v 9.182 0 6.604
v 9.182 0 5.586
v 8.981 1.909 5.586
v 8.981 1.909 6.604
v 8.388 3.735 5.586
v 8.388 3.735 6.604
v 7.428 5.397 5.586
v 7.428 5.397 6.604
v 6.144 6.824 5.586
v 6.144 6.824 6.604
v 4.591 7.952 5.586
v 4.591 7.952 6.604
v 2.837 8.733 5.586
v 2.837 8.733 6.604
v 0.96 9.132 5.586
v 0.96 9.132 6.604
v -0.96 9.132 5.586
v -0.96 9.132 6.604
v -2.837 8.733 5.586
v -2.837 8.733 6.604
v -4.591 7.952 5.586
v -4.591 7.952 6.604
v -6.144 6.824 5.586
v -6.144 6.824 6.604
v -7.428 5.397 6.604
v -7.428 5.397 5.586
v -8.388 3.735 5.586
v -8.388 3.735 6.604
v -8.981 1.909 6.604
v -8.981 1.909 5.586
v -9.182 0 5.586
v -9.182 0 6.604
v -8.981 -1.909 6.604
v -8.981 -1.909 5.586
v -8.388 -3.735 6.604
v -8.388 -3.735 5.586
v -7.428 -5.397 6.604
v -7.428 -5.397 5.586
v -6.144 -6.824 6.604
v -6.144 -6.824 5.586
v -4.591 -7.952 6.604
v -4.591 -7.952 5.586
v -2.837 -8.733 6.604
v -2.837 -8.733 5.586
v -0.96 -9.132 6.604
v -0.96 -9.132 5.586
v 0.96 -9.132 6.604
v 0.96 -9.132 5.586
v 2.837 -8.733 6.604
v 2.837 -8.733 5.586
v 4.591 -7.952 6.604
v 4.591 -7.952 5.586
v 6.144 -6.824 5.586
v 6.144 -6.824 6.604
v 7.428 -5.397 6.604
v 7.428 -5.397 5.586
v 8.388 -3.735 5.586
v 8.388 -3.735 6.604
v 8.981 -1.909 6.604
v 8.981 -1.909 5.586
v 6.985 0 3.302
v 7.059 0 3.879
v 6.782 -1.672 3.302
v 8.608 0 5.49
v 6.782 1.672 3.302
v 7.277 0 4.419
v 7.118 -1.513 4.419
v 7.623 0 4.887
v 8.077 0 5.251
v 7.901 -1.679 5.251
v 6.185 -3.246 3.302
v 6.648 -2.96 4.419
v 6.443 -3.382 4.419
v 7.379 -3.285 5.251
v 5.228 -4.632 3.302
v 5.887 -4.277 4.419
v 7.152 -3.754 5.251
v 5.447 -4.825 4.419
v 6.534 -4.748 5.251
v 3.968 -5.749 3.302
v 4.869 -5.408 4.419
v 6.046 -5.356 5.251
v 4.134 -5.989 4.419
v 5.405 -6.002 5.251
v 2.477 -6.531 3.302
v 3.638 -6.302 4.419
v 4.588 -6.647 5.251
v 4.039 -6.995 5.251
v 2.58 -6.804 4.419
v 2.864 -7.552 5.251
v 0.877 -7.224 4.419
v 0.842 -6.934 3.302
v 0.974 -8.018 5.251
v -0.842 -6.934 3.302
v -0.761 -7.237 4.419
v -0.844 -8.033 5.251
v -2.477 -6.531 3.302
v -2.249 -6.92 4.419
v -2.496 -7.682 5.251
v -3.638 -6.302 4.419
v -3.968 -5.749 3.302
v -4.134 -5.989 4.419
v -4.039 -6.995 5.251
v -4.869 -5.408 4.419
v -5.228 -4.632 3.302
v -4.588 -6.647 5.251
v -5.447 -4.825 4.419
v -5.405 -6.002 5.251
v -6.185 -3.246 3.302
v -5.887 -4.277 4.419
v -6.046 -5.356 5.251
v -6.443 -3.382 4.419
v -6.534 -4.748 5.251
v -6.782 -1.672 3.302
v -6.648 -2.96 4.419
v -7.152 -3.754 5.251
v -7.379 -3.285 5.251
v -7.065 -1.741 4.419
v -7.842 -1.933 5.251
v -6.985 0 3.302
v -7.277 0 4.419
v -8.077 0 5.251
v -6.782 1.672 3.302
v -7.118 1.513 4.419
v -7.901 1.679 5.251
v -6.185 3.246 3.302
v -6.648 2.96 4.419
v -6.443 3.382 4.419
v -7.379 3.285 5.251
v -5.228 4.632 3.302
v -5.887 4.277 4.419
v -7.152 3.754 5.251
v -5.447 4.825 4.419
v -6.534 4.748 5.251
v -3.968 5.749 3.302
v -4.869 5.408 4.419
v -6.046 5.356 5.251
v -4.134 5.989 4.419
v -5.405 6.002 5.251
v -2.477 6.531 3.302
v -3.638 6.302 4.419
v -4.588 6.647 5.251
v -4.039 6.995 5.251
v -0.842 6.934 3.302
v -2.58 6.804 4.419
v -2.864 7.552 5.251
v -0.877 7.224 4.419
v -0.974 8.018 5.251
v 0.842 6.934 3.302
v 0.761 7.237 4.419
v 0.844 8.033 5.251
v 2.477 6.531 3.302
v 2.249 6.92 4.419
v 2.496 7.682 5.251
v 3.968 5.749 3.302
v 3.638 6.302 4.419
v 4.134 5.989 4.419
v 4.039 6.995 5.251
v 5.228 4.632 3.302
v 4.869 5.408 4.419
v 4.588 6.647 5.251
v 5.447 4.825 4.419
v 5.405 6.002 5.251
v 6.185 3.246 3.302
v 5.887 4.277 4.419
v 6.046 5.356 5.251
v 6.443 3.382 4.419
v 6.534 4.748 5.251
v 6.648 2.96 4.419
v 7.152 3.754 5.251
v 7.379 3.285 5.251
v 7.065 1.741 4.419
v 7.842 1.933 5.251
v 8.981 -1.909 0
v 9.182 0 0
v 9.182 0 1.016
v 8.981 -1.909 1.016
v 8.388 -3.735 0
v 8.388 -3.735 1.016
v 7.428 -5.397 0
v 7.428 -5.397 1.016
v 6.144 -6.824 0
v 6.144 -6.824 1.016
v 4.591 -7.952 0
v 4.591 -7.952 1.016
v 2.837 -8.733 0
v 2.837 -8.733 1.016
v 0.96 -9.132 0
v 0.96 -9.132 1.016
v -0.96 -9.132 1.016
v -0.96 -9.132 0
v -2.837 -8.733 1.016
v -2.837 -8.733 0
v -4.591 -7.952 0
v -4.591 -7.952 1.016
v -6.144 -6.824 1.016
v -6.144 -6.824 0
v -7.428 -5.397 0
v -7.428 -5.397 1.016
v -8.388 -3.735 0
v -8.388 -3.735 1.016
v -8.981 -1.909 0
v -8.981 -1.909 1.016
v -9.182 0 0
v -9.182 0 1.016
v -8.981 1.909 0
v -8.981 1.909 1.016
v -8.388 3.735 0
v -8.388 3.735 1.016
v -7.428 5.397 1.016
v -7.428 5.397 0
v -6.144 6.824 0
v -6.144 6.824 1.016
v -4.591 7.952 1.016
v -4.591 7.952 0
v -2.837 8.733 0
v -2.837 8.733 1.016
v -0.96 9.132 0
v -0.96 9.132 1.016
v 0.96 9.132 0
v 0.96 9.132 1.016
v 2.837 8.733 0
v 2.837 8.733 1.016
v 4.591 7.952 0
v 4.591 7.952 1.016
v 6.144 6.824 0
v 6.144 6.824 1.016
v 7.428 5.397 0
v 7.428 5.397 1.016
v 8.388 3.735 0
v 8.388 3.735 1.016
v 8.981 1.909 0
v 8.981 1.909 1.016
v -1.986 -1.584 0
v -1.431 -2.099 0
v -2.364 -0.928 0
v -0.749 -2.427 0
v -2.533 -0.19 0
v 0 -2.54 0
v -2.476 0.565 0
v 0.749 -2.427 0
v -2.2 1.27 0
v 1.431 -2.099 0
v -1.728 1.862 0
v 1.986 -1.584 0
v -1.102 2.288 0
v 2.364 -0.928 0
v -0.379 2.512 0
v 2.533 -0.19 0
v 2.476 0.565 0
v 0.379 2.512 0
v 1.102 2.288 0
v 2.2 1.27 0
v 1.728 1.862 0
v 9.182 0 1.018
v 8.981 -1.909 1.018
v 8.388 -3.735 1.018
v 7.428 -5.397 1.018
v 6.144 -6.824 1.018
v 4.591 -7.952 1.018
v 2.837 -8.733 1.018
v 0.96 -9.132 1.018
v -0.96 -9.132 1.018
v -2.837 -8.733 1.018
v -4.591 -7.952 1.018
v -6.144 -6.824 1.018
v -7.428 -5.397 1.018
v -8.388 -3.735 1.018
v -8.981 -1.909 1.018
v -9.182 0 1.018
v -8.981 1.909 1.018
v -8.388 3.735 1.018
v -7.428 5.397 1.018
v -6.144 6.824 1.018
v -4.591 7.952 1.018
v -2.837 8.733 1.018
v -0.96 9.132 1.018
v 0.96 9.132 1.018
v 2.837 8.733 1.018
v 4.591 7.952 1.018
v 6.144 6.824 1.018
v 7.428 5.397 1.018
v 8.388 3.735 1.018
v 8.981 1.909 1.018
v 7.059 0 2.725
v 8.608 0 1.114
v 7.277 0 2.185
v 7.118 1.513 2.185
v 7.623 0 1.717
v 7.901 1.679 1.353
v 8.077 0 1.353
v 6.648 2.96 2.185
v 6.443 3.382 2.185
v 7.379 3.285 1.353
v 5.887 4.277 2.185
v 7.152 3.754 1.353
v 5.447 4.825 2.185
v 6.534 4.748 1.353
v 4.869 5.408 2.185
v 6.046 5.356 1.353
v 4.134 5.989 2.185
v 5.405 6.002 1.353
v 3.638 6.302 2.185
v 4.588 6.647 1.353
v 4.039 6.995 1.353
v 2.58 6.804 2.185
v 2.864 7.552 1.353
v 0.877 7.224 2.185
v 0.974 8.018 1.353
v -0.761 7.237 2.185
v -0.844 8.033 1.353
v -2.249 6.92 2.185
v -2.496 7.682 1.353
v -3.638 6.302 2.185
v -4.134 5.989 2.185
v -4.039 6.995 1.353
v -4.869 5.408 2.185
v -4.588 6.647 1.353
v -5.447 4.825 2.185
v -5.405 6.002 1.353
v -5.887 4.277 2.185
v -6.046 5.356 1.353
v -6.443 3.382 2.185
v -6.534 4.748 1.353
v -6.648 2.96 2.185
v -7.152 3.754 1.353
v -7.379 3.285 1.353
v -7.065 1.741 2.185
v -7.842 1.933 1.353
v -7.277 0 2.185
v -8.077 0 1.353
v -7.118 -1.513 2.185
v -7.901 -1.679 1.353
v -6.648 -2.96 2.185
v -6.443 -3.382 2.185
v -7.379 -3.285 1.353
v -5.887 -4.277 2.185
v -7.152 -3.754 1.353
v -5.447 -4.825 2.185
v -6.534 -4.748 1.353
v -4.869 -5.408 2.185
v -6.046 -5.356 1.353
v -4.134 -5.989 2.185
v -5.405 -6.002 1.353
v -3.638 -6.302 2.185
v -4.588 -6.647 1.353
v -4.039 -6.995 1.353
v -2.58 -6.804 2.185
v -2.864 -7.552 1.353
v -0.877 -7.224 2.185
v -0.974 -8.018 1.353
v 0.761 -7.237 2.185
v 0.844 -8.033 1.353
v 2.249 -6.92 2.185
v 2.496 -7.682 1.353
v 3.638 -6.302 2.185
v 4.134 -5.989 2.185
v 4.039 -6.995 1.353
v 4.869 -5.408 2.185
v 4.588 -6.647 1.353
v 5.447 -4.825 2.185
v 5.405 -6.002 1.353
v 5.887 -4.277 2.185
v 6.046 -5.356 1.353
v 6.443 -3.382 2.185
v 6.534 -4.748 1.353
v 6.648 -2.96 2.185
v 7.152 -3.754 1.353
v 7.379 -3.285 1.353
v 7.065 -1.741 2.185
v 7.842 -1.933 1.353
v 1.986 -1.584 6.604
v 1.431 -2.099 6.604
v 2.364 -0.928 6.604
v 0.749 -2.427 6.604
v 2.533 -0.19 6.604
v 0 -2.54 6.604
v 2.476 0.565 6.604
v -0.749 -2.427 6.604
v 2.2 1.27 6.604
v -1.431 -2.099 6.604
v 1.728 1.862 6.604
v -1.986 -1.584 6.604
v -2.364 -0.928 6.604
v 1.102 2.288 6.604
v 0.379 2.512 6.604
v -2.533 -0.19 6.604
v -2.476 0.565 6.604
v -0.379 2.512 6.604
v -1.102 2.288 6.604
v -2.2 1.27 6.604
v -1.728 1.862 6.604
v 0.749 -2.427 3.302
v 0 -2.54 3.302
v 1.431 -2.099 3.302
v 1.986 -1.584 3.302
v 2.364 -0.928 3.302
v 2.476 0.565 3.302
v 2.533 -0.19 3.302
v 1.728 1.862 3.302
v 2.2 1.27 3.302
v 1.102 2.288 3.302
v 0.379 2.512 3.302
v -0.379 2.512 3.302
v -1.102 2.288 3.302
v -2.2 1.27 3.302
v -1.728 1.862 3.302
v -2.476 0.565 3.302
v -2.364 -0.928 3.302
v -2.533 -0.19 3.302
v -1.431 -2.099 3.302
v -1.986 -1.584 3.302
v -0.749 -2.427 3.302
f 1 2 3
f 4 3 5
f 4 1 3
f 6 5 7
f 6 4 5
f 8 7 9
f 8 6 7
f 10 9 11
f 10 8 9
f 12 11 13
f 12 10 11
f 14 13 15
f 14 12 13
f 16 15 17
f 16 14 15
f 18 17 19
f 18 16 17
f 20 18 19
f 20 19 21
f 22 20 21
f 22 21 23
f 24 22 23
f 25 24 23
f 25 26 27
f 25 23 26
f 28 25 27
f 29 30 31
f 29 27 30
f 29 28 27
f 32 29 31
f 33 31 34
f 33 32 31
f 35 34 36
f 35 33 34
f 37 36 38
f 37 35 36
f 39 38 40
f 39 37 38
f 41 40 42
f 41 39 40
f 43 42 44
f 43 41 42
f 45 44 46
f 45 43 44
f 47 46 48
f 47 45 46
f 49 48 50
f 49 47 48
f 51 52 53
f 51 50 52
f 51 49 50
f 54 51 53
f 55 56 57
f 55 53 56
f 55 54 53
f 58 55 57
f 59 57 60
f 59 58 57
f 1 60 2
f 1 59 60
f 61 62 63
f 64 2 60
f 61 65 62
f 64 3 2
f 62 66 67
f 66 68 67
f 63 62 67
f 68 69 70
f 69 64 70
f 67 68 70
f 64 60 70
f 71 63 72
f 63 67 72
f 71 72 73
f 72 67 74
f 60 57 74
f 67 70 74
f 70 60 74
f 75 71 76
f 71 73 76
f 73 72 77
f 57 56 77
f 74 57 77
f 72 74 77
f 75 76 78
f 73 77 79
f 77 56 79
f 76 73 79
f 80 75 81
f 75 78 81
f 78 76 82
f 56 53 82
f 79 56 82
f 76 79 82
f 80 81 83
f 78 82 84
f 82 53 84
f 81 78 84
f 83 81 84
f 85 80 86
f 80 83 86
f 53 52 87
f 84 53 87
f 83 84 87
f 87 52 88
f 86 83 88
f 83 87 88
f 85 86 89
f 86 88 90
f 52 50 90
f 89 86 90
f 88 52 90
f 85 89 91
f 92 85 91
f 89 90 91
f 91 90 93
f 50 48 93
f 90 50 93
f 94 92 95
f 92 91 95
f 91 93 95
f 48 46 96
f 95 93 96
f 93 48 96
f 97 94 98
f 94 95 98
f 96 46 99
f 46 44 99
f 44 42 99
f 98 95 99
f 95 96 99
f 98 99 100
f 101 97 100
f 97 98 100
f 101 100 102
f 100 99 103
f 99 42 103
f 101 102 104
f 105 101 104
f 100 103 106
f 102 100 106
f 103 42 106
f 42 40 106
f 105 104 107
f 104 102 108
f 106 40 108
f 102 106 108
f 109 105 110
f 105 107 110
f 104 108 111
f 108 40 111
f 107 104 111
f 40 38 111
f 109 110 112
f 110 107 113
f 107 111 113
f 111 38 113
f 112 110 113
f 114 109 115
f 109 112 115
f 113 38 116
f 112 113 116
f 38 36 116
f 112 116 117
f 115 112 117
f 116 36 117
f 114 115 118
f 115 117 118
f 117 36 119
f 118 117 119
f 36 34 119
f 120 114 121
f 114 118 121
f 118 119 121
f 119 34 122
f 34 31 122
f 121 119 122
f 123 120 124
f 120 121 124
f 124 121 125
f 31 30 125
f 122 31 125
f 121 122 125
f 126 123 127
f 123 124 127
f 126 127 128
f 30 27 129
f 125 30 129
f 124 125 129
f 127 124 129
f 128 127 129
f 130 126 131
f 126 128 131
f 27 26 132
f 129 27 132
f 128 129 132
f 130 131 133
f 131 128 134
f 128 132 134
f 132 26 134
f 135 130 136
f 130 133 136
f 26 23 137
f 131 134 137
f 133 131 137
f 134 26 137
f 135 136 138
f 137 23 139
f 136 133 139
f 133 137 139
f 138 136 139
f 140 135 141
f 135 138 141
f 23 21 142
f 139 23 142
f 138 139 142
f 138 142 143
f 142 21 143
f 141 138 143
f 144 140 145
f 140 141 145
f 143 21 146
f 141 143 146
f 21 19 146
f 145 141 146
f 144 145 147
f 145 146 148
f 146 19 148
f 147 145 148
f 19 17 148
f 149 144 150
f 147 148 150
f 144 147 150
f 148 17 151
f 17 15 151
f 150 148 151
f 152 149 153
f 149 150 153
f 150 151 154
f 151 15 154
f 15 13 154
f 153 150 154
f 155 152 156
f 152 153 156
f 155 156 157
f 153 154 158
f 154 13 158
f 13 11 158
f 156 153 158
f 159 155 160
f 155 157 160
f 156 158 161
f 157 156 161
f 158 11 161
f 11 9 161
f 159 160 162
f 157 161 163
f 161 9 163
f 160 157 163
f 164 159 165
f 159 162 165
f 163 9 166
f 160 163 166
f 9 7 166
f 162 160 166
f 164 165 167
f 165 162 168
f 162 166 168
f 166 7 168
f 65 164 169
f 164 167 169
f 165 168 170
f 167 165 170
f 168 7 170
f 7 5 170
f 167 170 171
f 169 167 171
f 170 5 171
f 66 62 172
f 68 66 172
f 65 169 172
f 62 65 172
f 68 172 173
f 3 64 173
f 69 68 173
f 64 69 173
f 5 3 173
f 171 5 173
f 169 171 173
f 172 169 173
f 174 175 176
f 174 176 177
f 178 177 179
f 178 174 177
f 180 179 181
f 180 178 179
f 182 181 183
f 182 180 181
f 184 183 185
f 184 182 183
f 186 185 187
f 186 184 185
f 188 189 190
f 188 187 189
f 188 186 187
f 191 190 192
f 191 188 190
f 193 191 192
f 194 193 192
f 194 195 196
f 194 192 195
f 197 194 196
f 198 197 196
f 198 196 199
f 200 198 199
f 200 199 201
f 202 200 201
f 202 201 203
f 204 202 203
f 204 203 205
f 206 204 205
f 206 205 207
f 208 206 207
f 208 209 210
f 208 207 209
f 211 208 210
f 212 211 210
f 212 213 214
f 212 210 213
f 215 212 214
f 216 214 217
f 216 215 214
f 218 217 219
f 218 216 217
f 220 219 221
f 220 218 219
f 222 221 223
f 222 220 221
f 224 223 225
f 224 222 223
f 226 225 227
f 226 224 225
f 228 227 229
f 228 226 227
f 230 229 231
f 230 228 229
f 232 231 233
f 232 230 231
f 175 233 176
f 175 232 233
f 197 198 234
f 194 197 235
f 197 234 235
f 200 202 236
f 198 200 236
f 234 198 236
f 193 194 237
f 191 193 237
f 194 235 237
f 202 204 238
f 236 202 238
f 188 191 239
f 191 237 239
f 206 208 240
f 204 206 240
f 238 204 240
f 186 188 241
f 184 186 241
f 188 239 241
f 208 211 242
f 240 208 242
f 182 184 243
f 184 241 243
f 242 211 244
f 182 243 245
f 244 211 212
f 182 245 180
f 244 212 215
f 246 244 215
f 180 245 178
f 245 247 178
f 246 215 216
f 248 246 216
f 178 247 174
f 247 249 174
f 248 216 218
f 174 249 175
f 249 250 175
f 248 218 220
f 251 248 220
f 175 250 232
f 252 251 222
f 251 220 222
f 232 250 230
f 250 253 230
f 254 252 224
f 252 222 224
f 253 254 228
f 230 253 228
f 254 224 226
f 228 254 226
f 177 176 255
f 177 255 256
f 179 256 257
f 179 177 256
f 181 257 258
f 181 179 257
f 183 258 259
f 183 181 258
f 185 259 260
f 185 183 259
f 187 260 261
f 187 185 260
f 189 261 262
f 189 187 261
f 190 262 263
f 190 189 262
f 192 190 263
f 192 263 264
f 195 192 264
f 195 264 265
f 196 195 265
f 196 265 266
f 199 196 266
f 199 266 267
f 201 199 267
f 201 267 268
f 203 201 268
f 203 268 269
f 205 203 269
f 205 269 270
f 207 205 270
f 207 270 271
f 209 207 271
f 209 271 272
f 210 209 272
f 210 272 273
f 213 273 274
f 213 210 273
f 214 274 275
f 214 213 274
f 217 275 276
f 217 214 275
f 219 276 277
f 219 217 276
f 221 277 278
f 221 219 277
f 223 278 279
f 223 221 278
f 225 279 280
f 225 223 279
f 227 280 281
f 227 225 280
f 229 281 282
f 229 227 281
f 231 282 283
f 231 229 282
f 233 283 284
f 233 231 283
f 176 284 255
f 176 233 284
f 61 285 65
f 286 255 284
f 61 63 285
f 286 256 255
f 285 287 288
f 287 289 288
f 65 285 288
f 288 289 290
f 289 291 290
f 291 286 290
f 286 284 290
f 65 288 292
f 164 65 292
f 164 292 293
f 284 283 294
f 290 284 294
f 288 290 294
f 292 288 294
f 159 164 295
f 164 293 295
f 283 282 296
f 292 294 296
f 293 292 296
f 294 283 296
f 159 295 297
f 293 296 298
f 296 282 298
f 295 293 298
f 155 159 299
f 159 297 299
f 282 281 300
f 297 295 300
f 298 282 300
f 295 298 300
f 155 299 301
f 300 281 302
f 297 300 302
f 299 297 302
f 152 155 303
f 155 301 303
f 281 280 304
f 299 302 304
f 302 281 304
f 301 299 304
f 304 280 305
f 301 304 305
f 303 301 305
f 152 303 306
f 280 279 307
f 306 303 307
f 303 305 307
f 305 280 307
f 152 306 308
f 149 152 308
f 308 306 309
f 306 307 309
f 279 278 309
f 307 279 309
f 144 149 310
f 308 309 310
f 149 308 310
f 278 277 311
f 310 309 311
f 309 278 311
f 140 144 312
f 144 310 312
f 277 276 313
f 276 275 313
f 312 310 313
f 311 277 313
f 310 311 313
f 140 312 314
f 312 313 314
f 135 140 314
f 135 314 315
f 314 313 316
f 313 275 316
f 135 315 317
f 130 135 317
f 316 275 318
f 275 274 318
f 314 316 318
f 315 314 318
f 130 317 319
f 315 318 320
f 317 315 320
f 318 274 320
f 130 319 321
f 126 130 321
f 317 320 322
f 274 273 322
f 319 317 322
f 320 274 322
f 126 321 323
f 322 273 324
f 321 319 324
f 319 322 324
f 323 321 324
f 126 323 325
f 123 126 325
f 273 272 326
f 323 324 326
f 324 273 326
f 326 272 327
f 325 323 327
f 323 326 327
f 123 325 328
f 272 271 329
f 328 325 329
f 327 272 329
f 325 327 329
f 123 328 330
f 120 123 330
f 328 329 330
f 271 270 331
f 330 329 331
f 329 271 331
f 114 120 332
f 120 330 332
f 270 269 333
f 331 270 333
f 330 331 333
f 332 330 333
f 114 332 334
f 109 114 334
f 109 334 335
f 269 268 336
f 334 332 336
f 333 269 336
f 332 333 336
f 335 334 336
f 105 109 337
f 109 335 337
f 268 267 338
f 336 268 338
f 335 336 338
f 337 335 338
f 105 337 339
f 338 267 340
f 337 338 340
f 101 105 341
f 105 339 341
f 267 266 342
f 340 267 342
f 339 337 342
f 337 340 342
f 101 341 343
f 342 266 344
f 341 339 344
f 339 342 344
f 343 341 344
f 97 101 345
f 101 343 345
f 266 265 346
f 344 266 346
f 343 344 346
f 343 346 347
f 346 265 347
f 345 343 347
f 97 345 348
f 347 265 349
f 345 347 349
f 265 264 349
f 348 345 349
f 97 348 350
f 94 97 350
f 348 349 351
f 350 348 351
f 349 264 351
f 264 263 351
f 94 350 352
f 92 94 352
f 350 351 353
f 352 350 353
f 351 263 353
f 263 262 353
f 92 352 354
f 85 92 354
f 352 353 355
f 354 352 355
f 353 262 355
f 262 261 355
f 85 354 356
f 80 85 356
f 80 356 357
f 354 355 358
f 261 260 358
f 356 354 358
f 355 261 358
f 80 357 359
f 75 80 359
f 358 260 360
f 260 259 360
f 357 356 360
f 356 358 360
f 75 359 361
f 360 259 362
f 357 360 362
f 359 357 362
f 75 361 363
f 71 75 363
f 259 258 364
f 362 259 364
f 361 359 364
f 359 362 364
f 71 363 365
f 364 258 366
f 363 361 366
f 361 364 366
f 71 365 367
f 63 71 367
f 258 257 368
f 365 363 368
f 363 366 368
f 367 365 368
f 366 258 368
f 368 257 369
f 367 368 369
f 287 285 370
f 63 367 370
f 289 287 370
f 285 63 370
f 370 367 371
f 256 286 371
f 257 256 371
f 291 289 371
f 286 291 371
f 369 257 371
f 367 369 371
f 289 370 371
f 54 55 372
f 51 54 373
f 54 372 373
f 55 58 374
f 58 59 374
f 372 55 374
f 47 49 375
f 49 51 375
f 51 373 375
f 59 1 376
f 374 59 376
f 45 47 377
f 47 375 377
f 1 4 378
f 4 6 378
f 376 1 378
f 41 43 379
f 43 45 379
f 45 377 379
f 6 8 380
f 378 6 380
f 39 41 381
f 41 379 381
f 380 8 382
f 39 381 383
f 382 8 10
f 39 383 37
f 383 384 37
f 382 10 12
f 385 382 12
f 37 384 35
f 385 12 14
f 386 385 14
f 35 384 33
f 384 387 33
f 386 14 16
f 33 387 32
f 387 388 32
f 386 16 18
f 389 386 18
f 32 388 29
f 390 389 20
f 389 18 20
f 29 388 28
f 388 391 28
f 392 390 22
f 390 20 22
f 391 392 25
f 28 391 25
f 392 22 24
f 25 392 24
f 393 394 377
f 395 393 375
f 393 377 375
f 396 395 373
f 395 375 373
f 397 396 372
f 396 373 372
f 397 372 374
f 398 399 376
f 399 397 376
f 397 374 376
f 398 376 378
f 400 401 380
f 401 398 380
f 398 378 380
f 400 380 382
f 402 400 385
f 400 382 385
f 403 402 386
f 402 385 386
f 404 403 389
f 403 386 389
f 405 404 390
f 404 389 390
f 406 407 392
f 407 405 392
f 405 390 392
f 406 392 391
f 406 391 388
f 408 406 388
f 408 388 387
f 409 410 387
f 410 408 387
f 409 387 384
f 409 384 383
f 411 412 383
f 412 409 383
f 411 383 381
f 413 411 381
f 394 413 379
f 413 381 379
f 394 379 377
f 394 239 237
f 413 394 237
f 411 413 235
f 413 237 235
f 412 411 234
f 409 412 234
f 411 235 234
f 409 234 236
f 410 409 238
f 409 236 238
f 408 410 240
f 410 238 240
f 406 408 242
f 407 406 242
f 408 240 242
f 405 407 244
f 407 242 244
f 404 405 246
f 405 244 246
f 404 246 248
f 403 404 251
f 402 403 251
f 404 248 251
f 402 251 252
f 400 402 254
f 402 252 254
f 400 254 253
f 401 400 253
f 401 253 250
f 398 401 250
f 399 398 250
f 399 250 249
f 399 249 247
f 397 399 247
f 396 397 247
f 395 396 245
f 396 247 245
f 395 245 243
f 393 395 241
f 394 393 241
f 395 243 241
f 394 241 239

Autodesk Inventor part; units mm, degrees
ref_plane "YZ Plane" through (0, 0, 0) normal (1, 0, 0) x (0, 1, 0)
ref_plane "XZ Plane" through (0, 0, 0) normal (0, 1, 0) x (-1, 0, 0)
ref_plane "XY Plane" through (0, 0, 0) normal (0, 0, 1) x (1, 0, 0)
sketch "Sketch1" plane through (0, 0, 0) normal (0, 0, 1) x (1, 0, 0)
  circle A0 centre (0, 0) radius 9.1821
  dimension "d0" = 18.3642
extrude "Extrusion1" add sketch "Sketch1" along normal blind 1.016
sketch "Sketch2" plane through (0, 0, 1.016) normal (0, 0, 1) x (1, 0, 0)
  circle A0 centre (0, 0) radius 6.985
  dimension "d3" = 13.97
extrude "Extrusion2" add sketch "Sketch2" along normal blind 2.286
sketch "Sketch3" plane through (0, 0, 3.302) normal (0, 0, 1) x (1, 0, 0)
  point P0 (0, 0)
hole "Hole1" at (0, 0, 3.302) direction (0, 0, -1) diameter 5.08 depth 25.4 tip angle 118
mirror "Mirror1" about plane through (0, 0, 3.302) normal (0, 0, 1) of "Extrusion2", "Extrusion1", "Hole1"
fillet "Fillet1" radius 2.286 2 edges at (-6.985, 0, 1.016) (-6.985, 0, 5.588)
properties part number "pulley alpha"
